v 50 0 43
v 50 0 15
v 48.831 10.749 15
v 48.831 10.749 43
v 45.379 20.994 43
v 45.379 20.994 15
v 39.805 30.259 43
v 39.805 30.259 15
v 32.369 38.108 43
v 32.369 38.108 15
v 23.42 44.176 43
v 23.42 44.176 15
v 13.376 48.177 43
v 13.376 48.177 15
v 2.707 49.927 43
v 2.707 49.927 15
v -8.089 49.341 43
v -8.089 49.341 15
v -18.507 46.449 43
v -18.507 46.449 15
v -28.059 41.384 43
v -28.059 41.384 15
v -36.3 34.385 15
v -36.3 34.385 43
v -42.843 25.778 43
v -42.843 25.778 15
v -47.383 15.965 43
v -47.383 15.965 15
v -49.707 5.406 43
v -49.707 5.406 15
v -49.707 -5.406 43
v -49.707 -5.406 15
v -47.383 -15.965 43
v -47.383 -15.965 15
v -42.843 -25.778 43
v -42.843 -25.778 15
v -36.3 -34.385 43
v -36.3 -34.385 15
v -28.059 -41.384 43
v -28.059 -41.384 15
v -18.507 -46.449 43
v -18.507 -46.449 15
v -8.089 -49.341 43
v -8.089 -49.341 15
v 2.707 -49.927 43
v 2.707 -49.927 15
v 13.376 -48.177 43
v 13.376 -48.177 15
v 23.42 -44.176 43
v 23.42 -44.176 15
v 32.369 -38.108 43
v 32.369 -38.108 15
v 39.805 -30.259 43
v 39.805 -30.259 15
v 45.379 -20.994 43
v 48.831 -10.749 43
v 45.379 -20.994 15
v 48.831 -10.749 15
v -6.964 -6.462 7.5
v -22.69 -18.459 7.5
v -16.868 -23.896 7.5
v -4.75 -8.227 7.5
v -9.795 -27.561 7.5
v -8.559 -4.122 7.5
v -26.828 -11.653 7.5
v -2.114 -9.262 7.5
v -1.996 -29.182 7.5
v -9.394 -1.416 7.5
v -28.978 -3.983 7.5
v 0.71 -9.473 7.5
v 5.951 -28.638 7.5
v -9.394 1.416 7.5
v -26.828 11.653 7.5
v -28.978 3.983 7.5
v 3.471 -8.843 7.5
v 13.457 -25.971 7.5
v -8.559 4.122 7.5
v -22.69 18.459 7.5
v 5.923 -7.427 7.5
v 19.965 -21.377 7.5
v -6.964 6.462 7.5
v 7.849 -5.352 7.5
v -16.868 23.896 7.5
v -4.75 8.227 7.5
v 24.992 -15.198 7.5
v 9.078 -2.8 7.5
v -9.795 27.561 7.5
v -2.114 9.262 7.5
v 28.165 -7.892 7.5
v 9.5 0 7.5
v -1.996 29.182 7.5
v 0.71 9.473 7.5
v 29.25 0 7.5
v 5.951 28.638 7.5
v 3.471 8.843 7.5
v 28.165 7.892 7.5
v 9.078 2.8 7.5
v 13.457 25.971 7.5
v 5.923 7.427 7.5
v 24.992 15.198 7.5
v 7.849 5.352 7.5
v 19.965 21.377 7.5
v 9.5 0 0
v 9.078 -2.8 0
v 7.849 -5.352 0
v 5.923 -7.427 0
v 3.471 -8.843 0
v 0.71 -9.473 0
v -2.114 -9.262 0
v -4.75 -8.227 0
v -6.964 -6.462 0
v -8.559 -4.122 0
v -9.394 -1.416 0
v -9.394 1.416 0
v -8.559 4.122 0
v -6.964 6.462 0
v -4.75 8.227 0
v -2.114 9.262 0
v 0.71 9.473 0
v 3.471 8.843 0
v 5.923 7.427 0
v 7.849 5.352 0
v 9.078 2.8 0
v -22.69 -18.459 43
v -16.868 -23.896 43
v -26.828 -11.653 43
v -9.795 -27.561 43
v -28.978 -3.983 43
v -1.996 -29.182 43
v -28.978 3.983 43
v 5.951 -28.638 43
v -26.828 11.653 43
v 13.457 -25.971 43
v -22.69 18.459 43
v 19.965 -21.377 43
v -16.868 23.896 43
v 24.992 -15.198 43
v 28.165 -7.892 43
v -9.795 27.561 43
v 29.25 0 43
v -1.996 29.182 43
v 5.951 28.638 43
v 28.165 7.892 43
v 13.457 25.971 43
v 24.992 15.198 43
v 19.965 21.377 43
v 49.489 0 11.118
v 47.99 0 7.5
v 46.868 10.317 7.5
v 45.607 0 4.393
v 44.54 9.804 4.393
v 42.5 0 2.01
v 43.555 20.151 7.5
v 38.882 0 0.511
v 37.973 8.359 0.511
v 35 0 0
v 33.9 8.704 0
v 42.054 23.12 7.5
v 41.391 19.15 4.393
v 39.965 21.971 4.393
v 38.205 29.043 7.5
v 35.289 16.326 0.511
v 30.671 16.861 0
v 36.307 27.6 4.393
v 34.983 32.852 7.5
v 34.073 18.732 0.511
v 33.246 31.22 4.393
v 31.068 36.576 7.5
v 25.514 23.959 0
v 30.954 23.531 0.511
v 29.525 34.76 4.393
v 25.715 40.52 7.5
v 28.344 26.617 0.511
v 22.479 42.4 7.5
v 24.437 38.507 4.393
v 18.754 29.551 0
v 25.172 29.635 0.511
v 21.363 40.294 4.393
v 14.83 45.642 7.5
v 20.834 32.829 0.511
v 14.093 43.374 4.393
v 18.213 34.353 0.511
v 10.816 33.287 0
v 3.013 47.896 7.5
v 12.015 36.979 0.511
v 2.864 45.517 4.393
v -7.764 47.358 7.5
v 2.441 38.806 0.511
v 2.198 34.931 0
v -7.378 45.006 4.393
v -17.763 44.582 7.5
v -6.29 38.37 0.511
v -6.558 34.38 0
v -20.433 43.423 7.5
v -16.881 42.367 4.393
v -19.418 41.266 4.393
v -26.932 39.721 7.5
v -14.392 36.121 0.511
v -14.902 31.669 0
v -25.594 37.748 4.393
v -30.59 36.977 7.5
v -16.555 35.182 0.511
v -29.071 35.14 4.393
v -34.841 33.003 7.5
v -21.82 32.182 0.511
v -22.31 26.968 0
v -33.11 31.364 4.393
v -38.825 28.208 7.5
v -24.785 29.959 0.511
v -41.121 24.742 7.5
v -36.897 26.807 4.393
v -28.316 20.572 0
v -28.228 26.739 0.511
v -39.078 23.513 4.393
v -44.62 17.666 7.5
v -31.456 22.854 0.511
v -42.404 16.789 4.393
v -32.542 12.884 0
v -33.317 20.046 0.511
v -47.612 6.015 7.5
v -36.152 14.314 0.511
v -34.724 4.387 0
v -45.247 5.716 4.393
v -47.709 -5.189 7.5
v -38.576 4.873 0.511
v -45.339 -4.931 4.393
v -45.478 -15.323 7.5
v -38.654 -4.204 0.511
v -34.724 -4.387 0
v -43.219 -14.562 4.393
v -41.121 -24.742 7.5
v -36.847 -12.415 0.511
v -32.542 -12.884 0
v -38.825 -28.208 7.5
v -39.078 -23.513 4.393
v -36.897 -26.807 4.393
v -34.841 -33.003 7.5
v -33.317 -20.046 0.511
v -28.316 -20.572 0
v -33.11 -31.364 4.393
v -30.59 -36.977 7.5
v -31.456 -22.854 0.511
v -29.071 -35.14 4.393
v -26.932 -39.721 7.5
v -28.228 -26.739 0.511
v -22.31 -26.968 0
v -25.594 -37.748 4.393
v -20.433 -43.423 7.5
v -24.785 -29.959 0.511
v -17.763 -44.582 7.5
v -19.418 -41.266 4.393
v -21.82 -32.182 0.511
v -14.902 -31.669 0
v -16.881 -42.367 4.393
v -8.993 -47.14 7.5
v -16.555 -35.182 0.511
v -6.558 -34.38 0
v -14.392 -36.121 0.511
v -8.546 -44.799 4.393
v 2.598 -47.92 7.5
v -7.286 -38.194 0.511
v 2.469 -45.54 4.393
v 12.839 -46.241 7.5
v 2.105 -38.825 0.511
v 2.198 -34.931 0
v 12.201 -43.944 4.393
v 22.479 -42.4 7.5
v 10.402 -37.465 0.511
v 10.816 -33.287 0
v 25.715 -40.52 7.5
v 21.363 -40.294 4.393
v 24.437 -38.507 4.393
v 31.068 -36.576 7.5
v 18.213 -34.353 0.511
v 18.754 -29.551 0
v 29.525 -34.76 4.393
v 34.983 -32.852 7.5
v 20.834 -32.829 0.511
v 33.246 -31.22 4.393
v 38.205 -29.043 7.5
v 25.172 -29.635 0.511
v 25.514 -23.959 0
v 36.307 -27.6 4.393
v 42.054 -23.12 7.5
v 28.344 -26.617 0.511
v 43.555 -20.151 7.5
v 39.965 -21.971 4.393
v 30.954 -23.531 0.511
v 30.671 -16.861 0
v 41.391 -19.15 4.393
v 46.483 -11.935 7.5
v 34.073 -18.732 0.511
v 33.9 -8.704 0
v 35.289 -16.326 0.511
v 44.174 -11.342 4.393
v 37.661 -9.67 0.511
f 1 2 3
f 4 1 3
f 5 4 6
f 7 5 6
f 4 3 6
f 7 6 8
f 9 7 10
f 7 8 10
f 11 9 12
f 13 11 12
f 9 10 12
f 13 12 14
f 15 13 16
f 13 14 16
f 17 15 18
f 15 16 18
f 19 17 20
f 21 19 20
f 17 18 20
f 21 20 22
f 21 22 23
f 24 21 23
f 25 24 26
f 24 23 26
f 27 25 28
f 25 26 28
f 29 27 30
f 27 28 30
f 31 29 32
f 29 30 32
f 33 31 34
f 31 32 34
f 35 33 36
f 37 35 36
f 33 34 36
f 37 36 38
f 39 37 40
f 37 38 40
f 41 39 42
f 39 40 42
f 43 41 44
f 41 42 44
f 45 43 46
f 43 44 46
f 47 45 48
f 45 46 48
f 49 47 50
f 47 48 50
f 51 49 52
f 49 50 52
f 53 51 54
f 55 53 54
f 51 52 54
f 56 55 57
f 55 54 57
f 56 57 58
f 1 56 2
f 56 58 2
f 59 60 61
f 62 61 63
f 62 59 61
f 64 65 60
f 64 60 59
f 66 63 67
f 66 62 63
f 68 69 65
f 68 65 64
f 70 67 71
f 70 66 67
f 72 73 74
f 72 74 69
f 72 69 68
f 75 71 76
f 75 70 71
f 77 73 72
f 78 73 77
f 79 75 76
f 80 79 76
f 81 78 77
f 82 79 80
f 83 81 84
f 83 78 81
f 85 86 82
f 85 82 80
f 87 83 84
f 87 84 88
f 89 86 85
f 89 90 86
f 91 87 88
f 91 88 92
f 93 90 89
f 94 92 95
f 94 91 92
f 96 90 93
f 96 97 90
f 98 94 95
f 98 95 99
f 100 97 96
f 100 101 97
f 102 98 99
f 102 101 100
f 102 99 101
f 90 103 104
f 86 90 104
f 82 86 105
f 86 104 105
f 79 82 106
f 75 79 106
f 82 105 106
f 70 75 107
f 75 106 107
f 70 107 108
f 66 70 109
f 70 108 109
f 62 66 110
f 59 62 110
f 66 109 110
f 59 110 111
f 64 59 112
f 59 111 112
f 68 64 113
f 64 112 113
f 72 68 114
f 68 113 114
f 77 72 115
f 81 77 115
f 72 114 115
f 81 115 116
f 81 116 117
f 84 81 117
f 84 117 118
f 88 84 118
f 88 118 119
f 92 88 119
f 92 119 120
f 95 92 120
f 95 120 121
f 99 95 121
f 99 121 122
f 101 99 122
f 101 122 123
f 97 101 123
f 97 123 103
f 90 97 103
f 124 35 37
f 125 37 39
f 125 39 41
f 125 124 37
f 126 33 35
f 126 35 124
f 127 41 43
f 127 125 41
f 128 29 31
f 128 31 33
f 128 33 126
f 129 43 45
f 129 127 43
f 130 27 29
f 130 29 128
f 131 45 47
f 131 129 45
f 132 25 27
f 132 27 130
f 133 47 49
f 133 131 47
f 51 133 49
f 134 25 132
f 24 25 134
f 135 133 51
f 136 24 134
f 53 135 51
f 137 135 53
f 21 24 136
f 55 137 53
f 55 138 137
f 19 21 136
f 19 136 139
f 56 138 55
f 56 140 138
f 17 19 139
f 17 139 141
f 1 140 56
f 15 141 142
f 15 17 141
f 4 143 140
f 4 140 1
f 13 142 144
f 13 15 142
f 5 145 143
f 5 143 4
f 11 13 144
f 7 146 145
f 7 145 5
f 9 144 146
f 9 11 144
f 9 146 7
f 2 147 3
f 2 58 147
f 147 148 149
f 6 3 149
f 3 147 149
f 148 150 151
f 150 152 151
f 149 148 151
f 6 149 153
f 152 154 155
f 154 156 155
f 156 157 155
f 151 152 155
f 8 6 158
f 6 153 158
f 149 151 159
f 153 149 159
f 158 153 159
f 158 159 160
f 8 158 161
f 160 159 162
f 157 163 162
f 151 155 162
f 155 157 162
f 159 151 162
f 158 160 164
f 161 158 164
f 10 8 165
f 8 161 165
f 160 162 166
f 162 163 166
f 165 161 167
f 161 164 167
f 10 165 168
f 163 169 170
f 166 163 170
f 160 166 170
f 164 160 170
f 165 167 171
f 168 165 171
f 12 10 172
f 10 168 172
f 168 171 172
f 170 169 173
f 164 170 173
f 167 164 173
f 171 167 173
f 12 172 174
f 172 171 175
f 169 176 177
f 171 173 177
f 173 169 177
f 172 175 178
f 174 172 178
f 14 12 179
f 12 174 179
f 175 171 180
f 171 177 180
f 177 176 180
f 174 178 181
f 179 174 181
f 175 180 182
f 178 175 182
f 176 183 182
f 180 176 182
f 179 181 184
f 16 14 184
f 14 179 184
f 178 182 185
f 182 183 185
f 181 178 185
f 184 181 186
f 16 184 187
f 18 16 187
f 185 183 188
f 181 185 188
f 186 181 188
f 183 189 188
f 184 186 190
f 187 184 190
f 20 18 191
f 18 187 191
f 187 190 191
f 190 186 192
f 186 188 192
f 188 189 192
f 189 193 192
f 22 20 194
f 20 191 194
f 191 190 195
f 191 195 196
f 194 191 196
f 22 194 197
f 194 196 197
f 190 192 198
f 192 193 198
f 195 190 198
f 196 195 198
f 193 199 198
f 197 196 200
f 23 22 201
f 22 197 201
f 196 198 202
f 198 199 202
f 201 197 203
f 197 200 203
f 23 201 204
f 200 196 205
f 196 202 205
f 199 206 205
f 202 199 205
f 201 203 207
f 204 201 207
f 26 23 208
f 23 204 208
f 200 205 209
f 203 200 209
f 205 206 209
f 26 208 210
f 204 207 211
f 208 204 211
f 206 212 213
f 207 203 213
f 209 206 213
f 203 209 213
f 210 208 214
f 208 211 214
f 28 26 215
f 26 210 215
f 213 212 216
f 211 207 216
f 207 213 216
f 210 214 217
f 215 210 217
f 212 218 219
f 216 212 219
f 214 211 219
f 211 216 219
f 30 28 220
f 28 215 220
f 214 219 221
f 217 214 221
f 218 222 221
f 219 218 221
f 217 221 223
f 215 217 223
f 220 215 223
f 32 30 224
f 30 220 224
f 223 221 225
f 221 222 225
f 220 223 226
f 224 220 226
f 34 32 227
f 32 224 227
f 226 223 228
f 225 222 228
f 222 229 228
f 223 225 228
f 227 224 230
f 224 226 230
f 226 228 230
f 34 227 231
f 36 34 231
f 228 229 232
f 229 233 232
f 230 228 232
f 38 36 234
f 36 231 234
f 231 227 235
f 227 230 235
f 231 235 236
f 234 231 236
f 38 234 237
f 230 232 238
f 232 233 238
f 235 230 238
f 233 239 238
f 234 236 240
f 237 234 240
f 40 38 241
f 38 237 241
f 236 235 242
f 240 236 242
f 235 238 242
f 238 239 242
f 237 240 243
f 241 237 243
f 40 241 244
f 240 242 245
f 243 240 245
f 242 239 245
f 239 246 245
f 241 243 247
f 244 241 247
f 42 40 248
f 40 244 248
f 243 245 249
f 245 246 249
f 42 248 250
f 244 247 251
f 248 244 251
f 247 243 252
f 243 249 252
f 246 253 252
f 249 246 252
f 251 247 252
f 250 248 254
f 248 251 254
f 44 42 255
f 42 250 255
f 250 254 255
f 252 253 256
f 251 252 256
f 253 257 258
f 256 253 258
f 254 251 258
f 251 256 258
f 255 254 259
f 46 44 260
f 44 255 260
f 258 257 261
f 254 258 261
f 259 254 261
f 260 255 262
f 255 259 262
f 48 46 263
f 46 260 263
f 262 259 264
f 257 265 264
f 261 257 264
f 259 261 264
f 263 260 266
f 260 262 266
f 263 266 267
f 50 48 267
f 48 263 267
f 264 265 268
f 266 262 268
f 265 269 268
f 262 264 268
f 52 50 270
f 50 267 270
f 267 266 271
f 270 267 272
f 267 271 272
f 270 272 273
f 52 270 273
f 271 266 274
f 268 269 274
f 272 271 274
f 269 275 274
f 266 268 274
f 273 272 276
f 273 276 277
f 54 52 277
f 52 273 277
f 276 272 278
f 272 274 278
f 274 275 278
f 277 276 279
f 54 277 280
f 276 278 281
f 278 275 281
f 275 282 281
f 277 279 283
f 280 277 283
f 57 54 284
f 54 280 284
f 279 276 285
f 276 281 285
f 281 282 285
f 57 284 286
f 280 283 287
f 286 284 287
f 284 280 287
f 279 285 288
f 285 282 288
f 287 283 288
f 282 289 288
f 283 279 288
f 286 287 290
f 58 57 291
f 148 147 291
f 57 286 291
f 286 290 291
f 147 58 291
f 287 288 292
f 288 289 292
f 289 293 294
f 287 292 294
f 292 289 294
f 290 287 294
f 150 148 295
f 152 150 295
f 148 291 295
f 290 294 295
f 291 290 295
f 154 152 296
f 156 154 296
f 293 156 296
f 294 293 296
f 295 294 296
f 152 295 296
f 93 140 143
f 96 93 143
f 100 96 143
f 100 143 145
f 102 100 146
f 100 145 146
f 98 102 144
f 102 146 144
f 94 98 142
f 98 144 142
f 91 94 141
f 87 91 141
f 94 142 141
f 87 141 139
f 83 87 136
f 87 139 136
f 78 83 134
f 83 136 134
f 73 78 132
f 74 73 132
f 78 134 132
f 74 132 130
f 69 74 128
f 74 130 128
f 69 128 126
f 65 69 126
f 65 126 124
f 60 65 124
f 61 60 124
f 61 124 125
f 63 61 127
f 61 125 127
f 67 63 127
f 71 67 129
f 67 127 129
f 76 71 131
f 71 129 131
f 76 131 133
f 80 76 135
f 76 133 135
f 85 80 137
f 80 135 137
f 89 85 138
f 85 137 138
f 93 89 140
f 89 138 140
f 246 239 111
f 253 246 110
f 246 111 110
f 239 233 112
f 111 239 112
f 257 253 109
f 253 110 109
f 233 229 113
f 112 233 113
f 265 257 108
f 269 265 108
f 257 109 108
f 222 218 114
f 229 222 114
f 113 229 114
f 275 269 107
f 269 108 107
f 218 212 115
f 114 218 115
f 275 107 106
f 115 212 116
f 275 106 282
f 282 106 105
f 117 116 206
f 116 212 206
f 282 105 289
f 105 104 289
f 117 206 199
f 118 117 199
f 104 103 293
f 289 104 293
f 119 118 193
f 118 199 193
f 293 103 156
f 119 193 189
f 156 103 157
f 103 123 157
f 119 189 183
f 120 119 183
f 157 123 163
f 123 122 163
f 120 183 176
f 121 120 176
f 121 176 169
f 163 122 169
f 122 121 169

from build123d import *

# Parameters (mm, degrees)
F0_R     = 50
F1_DEPTH = 43
F2_R     = 29.25
F3_DEPTH = 35.5
F4_R     = 15
F5_R     = 9.5
F6_DEPTH = 8


with BuildPart() as f1:
    # F0 (on Top) → F1 (new body)
    with BuildSketch(Plane.XY):
        Circle(F0_R)
    extrude(amount=F1_DEPTH)

    # F2 (on face) → F3 (cut)
    with BuildSketch(Plane.XY.offset(43)):
        Circle(F2_R)
    extrude(amount=-F3_DEPTH, mode=Mode.SUBTRACT)

    # F4
    f4_edges = [f1.edges().sort_by_distance(p)[0] for p in [
        (-50, 0, 0),
    ]]
    fillet(f4_edges, radius=F4_R)

    # F5 (on face) → F6 (cut)
    with BuildSketch(Plane(origin=(0, 0, 0), x_dir=(1, 0, 0), z_dir=(0, 0, -1))):
        Circle(F5_R)
    extrude(amount=-F6_DEPTH, mode=Mode.SUBTRACT)


solid = f1.part
